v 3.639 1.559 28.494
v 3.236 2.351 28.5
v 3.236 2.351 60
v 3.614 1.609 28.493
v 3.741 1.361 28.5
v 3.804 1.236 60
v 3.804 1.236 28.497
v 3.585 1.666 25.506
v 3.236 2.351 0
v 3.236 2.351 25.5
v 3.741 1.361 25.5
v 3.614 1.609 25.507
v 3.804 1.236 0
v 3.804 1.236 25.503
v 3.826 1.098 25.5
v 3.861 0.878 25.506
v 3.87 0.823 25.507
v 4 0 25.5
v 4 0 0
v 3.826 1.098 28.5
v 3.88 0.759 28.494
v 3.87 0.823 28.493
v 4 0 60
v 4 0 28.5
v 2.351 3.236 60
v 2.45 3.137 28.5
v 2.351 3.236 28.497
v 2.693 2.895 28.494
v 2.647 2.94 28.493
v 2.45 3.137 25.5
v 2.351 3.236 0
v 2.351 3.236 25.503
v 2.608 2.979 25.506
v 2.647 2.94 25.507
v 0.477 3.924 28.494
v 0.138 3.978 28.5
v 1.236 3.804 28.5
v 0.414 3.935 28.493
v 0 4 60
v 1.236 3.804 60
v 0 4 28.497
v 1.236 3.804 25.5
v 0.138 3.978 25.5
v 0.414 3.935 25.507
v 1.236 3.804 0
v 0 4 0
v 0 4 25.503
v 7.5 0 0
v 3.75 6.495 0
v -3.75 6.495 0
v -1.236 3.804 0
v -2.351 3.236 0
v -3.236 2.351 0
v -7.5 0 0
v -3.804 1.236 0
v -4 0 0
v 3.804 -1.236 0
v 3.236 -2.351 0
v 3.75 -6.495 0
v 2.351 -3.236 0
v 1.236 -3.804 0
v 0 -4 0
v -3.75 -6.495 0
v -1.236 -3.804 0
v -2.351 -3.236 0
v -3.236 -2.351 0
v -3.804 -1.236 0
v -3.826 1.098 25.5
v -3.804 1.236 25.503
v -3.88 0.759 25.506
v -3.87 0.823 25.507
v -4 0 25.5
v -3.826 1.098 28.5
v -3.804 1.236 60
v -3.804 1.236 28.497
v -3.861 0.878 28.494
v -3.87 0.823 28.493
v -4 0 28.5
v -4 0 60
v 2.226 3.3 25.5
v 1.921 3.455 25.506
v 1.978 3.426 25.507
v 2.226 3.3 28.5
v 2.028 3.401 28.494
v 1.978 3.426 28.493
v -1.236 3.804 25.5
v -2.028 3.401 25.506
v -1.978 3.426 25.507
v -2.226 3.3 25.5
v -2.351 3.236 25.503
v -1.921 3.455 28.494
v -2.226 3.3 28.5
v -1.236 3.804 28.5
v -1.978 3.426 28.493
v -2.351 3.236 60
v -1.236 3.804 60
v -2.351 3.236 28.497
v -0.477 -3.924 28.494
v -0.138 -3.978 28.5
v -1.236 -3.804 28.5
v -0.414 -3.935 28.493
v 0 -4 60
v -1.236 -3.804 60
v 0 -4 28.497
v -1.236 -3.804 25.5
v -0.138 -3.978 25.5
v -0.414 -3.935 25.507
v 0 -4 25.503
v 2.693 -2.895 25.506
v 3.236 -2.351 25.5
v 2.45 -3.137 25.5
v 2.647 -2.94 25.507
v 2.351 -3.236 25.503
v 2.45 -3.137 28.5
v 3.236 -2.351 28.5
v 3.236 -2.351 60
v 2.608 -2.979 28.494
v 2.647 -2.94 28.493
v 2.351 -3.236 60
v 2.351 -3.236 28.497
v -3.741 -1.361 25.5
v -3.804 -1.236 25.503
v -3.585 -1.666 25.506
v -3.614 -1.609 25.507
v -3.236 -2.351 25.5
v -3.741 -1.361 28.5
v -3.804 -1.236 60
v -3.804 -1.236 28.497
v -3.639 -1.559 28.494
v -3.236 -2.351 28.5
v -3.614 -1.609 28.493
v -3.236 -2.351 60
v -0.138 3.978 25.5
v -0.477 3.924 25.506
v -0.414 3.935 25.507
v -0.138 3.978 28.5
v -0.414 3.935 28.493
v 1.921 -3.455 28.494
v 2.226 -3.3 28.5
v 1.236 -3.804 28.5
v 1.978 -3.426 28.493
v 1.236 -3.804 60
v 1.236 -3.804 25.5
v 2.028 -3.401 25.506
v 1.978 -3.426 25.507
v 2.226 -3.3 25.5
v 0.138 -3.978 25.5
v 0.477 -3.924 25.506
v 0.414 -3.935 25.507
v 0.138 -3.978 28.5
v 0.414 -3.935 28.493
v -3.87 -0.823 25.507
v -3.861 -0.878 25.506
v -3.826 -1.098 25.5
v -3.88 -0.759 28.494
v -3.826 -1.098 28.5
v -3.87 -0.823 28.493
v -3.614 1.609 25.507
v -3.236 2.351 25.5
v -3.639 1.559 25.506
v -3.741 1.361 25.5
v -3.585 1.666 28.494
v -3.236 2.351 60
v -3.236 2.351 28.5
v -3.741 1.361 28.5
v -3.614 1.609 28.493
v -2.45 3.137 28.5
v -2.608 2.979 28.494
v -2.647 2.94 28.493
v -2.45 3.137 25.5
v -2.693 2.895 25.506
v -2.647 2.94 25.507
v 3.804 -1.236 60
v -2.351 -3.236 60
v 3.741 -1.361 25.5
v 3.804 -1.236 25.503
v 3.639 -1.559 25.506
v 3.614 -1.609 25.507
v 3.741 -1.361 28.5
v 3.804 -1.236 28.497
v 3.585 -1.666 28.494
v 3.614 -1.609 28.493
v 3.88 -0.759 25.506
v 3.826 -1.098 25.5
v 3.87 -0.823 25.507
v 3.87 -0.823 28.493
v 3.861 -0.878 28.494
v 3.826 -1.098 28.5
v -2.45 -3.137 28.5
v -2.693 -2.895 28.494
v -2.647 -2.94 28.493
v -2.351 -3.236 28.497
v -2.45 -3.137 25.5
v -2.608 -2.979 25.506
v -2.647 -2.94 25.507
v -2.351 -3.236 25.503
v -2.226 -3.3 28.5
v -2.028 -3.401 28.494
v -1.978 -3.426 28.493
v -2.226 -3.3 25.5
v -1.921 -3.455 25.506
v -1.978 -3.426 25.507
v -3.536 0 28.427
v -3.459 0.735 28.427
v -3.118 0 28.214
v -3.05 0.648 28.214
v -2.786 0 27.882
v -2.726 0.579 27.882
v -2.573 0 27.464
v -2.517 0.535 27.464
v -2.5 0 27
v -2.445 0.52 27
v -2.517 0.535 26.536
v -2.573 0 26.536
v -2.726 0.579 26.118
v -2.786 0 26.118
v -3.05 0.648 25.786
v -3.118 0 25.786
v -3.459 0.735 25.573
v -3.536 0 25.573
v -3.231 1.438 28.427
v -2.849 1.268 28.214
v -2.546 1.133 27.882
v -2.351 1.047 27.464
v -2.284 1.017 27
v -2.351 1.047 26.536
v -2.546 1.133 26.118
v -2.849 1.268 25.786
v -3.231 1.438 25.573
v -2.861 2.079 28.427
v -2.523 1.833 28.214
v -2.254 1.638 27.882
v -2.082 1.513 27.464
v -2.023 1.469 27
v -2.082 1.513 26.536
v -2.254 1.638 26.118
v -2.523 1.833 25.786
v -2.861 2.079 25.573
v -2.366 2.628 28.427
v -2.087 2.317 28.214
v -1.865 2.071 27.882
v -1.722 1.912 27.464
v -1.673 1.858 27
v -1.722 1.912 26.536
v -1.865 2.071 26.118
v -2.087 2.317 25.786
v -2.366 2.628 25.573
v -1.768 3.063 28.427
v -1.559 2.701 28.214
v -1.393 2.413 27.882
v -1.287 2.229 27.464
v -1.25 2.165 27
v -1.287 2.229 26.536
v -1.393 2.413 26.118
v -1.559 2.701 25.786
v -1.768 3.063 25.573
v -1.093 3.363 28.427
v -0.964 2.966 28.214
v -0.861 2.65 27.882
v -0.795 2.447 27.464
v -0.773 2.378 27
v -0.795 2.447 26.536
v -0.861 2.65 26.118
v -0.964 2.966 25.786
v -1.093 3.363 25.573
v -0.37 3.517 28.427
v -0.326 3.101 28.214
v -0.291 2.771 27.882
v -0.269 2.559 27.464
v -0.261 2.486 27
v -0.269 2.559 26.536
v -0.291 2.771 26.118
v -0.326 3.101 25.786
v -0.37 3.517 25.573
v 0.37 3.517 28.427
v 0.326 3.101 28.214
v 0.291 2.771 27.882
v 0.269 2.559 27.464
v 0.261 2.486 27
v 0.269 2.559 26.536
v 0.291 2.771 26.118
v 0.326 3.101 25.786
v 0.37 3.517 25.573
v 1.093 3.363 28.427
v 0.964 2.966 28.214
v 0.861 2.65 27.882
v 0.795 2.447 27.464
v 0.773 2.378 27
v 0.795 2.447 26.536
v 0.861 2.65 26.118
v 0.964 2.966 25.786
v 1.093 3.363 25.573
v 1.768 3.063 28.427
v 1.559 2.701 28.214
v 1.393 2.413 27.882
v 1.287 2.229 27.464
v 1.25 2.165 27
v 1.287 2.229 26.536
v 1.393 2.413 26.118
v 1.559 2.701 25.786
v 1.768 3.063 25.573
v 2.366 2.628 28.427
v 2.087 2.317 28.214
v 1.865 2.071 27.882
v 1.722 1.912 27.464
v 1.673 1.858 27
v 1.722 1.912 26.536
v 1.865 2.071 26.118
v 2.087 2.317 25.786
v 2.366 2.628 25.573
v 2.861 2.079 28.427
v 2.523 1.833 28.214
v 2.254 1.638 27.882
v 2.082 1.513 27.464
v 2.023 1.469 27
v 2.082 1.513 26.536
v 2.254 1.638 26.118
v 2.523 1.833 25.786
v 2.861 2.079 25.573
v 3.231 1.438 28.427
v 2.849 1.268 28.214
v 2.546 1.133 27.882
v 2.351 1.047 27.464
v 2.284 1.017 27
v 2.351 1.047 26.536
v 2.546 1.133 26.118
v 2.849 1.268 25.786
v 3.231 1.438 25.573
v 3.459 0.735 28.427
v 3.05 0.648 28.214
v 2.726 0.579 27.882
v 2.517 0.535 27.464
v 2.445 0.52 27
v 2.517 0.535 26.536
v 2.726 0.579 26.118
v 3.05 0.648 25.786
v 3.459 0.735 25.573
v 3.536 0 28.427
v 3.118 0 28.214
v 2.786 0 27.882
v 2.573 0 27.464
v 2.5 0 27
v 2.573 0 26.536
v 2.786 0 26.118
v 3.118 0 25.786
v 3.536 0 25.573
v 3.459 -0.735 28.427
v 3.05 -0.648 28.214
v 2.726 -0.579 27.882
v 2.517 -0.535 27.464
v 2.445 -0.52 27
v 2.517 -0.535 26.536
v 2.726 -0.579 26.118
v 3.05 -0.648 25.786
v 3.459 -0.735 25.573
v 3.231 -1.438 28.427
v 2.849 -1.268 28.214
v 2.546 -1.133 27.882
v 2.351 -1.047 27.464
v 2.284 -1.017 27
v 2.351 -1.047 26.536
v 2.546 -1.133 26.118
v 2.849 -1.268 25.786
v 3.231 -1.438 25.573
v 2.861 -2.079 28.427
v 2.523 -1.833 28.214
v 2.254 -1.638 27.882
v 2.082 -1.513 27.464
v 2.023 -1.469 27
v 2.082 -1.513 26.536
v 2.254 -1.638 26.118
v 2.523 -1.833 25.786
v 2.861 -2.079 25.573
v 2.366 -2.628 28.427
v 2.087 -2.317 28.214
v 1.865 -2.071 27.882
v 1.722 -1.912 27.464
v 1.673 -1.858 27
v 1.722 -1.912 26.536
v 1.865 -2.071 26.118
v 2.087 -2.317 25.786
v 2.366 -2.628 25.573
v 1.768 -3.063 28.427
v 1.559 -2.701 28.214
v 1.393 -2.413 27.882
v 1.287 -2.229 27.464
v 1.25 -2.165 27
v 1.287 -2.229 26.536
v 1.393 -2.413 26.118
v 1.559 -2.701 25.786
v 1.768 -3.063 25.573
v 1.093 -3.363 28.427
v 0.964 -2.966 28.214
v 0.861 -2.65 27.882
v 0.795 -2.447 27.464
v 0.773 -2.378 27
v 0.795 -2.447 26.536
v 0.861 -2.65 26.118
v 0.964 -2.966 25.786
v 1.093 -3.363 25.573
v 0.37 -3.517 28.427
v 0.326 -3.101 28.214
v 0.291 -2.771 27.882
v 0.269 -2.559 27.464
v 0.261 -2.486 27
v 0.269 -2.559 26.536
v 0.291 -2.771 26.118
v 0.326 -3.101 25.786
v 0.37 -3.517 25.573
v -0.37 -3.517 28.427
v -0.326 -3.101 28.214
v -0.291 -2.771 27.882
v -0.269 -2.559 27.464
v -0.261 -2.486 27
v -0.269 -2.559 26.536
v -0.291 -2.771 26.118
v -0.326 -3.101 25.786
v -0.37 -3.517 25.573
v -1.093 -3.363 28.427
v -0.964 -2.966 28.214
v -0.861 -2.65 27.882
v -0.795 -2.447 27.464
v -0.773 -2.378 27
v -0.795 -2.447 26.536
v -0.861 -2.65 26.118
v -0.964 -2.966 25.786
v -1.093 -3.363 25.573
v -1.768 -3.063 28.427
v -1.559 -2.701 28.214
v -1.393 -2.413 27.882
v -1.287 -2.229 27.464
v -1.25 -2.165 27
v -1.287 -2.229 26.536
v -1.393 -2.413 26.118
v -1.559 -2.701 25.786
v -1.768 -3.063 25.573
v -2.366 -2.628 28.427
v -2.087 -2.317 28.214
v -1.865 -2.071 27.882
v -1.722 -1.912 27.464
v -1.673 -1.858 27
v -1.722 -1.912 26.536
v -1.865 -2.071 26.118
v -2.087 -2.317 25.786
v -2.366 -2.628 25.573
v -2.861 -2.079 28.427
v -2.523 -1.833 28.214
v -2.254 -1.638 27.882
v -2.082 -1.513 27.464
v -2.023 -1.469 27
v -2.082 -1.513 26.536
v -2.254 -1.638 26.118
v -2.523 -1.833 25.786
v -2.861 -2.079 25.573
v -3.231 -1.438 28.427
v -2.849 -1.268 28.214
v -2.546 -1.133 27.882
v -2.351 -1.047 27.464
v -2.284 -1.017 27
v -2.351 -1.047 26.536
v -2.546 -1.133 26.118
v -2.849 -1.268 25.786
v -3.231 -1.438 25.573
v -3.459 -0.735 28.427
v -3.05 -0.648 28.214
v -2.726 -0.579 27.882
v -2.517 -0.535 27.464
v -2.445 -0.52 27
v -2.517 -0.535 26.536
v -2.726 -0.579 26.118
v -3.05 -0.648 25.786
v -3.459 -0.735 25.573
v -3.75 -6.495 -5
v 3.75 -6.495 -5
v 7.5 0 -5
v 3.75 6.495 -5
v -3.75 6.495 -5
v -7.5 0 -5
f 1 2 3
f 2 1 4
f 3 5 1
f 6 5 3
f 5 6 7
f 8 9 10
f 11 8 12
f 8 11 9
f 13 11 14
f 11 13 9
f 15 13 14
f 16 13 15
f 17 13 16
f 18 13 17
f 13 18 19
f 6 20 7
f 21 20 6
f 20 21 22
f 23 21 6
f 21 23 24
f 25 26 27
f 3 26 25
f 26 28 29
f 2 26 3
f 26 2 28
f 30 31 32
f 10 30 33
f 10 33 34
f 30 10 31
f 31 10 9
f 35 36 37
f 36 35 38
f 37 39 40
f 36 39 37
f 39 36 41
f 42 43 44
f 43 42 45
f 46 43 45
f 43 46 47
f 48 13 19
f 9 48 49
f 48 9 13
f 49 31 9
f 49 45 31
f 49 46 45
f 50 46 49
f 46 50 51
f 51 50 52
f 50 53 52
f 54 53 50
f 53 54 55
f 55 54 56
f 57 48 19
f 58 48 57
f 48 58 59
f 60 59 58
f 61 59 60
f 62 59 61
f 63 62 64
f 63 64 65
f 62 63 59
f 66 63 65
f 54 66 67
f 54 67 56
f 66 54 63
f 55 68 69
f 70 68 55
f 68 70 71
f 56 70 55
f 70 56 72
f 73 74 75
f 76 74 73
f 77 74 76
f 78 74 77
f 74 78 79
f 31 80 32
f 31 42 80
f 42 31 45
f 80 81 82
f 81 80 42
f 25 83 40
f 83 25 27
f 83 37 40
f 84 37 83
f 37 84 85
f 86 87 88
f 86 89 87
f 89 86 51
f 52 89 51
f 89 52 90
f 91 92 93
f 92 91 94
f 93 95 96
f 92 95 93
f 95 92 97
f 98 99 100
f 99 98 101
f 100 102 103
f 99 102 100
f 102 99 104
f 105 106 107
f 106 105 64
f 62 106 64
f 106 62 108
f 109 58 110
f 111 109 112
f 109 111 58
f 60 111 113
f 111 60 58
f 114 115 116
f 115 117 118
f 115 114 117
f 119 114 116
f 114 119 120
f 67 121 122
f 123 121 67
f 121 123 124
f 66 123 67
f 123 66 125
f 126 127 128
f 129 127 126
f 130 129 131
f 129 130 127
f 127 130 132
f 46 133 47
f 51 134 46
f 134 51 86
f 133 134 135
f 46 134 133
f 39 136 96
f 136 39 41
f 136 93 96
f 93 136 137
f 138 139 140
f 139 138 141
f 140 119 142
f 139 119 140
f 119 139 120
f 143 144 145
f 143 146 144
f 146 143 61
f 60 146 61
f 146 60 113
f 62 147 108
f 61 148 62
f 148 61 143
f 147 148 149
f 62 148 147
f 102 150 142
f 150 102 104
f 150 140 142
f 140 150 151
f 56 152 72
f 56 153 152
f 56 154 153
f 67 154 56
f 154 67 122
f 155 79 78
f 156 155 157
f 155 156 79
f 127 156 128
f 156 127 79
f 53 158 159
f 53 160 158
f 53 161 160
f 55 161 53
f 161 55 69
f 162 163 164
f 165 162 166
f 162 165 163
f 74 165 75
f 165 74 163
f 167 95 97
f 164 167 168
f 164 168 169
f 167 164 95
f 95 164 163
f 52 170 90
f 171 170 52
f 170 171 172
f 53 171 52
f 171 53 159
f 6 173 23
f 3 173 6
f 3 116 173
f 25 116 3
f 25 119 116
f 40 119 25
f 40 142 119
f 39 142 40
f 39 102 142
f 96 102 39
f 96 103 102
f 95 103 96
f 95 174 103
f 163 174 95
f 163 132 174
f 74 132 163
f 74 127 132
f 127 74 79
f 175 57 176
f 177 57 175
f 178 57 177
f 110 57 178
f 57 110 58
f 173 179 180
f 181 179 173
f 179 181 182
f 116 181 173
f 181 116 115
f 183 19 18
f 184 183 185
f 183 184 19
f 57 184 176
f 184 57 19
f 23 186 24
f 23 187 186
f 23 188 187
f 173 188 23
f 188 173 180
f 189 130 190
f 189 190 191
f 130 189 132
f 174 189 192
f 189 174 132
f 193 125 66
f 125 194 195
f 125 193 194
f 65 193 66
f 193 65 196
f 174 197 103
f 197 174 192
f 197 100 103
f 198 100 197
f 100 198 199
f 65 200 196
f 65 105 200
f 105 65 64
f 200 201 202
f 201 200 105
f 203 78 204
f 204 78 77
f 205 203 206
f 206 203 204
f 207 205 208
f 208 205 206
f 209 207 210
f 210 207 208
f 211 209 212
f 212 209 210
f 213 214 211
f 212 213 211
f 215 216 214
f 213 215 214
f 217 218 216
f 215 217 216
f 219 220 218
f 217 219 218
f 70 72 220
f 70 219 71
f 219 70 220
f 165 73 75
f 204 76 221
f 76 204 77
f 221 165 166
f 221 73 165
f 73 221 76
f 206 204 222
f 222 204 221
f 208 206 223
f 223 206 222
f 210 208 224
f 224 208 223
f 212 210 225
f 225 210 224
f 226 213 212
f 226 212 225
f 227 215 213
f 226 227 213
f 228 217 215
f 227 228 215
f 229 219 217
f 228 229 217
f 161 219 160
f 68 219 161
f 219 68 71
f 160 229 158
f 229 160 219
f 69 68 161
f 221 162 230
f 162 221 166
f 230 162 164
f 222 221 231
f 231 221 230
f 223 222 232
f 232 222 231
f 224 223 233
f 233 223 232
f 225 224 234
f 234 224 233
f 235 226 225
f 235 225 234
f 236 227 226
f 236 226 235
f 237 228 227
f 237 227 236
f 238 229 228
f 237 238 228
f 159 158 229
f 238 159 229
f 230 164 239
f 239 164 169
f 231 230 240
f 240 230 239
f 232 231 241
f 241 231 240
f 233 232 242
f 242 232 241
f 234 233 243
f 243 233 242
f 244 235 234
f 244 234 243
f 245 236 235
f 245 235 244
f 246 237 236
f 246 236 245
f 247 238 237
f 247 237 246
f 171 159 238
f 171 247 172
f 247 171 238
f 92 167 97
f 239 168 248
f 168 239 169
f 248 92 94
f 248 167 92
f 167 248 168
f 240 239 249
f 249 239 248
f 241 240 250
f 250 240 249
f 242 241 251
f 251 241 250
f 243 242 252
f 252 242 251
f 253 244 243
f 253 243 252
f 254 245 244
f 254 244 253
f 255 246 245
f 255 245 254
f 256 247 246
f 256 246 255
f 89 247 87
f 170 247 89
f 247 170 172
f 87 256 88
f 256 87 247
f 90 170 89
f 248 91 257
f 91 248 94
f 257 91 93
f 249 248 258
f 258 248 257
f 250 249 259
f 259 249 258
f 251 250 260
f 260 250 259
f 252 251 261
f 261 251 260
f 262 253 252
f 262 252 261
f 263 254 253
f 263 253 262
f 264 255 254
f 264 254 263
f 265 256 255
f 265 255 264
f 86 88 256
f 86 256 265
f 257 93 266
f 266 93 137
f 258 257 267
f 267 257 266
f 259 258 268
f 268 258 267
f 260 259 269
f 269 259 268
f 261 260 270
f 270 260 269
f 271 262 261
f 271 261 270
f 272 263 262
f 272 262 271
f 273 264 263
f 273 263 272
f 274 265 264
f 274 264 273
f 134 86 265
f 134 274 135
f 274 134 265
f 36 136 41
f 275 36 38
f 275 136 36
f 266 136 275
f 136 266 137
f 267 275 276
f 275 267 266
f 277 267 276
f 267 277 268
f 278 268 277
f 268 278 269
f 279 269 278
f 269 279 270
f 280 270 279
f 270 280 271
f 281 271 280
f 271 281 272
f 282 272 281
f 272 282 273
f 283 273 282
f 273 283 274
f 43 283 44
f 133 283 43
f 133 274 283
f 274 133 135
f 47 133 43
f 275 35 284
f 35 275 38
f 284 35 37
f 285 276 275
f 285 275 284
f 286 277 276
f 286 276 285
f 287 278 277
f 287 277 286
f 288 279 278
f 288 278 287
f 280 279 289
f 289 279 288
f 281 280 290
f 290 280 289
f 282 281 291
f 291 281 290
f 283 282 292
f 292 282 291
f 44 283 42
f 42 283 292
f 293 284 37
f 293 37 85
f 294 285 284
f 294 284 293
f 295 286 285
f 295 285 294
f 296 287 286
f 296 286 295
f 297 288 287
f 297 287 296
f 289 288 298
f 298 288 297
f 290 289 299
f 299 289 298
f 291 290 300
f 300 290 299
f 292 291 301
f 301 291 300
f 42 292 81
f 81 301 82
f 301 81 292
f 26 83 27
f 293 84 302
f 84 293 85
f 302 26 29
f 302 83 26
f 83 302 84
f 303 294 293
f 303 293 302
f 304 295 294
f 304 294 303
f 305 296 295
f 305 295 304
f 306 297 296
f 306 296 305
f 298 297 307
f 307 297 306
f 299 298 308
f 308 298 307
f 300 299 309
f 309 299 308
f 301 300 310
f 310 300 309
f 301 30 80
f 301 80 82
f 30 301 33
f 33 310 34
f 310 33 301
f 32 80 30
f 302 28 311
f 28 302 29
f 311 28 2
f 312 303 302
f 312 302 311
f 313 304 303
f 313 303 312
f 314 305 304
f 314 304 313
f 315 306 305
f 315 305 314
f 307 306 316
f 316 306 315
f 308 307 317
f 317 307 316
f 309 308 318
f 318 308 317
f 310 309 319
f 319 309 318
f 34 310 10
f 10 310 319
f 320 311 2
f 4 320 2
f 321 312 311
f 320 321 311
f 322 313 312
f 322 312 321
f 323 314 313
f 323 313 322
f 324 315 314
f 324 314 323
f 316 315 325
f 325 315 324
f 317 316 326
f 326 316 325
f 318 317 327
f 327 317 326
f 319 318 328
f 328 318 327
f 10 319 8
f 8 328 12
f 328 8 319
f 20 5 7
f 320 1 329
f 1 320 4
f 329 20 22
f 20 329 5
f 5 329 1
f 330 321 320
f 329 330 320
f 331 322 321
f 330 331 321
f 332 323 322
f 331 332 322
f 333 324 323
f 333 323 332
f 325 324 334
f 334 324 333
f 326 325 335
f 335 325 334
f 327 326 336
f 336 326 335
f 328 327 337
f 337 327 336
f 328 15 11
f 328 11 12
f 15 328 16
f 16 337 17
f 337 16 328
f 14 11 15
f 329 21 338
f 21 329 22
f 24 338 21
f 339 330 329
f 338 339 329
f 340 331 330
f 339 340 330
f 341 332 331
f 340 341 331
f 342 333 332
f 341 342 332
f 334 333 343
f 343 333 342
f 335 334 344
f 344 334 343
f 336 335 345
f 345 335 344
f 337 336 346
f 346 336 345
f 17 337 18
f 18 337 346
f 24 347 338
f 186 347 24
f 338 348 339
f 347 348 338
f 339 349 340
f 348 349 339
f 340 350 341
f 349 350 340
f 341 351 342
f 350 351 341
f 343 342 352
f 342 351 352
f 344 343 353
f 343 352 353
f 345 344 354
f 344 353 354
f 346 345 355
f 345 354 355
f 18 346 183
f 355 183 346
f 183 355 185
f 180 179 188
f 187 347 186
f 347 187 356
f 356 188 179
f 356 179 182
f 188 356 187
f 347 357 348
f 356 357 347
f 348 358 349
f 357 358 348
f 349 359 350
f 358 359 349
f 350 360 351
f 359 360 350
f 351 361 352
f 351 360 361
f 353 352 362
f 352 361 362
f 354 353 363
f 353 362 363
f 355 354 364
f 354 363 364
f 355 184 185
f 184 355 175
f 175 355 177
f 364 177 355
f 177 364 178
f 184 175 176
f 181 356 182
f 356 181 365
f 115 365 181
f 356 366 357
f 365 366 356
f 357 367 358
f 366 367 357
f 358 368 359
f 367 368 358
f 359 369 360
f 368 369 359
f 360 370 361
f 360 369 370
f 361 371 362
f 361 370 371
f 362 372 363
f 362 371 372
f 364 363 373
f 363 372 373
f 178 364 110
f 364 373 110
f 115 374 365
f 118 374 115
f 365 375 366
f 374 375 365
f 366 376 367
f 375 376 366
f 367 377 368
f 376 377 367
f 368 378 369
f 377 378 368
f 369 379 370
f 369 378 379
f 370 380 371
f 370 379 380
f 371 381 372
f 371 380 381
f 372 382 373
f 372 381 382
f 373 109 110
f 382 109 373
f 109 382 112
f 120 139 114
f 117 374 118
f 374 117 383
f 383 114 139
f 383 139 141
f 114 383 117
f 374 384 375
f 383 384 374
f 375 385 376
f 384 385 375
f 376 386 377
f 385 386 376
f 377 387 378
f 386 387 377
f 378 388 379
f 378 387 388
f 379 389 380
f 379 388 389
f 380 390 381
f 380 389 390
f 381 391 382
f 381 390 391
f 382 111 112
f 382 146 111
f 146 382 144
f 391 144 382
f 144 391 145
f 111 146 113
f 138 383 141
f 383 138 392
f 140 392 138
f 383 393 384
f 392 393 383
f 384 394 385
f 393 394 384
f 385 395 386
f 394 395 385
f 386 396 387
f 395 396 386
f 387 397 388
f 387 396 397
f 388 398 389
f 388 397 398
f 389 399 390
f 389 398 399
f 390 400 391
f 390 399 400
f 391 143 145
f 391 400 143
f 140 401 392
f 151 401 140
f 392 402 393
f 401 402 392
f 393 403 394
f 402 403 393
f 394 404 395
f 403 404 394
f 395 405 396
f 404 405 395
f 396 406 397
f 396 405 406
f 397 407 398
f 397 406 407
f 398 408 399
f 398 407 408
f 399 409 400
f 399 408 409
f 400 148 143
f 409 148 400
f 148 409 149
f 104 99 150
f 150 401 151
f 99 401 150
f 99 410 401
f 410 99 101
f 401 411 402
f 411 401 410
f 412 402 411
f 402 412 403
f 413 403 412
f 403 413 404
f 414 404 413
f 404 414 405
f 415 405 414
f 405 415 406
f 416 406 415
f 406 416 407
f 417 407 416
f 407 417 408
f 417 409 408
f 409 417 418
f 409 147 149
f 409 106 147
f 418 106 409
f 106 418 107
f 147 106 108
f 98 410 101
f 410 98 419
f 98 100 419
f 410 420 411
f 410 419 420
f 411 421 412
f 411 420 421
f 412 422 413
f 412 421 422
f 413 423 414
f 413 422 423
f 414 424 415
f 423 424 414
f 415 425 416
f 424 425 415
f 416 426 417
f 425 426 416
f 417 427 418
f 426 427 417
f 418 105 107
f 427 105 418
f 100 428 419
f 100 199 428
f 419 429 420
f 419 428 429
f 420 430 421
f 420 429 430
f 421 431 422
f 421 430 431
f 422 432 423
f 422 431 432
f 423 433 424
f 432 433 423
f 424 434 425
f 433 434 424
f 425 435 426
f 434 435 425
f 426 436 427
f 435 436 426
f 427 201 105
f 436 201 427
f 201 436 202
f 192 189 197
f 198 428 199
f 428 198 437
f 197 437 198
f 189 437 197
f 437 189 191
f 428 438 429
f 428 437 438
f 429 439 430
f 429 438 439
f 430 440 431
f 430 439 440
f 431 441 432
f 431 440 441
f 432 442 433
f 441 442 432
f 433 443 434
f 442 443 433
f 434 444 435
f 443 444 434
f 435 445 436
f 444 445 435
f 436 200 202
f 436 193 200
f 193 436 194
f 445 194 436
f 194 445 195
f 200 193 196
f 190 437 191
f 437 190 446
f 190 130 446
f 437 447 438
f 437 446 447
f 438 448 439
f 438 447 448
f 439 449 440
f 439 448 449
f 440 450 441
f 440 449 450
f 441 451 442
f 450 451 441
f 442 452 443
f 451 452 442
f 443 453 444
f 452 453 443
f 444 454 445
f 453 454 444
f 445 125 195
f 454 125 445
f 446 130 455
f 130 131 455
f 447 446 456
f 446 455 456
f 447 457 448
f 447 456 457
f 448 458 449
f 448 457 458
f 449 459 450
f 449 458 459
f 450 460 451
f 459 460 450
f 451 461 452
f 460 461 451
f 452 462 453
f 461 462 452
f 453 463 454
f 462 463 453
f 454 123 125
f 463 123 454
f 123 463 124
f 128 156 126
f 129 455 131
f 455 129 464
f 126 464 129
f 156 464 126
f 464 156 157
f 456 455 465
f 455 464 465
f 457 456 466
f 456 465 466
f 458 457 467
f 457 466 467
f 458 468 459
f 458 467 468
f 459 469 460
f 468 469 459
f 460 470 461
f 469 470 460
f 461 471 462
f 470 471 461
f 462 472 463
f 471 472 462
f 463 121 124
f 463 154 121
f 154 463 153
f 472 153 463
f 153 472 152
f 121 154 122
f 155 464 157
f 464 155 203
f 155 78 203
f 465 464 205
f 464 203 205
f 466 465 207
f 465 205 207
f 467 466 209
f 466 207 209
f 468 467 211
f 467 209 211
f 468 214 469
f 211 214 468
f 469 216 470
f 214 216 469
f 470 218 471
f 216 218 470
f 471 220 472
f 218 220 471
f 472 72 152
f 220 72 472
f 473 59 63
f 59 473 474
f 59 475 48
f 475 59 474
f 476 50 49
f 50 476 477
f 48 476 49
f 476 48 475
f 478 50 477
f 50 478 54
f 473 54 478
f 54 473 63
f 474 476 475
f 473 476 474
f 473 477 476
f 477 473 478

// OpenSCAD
bolt_len=60;
oring_diameter = 5;   //-- Interior diameter
oring_width=3;


//-- Bolt hex head
translate([0,0,-5/2])
  cylinder(r=15/2, h=5, $fn=6, center=true);

difference() {
  //-- Bolt body 
  translate([0,0,bolt_len/2])
    cylinder(r=8/2,h=bolt_len,center=true, $fn=20);

  //-- Mark
  translate([0,0,27])
    rotate_extrude(convexity = 10, $fn=30)
      translate([oring_diameter/2 + oring_width/2, 0, 0])
      circle(r = oring_width/2, $fn = 20);
}
